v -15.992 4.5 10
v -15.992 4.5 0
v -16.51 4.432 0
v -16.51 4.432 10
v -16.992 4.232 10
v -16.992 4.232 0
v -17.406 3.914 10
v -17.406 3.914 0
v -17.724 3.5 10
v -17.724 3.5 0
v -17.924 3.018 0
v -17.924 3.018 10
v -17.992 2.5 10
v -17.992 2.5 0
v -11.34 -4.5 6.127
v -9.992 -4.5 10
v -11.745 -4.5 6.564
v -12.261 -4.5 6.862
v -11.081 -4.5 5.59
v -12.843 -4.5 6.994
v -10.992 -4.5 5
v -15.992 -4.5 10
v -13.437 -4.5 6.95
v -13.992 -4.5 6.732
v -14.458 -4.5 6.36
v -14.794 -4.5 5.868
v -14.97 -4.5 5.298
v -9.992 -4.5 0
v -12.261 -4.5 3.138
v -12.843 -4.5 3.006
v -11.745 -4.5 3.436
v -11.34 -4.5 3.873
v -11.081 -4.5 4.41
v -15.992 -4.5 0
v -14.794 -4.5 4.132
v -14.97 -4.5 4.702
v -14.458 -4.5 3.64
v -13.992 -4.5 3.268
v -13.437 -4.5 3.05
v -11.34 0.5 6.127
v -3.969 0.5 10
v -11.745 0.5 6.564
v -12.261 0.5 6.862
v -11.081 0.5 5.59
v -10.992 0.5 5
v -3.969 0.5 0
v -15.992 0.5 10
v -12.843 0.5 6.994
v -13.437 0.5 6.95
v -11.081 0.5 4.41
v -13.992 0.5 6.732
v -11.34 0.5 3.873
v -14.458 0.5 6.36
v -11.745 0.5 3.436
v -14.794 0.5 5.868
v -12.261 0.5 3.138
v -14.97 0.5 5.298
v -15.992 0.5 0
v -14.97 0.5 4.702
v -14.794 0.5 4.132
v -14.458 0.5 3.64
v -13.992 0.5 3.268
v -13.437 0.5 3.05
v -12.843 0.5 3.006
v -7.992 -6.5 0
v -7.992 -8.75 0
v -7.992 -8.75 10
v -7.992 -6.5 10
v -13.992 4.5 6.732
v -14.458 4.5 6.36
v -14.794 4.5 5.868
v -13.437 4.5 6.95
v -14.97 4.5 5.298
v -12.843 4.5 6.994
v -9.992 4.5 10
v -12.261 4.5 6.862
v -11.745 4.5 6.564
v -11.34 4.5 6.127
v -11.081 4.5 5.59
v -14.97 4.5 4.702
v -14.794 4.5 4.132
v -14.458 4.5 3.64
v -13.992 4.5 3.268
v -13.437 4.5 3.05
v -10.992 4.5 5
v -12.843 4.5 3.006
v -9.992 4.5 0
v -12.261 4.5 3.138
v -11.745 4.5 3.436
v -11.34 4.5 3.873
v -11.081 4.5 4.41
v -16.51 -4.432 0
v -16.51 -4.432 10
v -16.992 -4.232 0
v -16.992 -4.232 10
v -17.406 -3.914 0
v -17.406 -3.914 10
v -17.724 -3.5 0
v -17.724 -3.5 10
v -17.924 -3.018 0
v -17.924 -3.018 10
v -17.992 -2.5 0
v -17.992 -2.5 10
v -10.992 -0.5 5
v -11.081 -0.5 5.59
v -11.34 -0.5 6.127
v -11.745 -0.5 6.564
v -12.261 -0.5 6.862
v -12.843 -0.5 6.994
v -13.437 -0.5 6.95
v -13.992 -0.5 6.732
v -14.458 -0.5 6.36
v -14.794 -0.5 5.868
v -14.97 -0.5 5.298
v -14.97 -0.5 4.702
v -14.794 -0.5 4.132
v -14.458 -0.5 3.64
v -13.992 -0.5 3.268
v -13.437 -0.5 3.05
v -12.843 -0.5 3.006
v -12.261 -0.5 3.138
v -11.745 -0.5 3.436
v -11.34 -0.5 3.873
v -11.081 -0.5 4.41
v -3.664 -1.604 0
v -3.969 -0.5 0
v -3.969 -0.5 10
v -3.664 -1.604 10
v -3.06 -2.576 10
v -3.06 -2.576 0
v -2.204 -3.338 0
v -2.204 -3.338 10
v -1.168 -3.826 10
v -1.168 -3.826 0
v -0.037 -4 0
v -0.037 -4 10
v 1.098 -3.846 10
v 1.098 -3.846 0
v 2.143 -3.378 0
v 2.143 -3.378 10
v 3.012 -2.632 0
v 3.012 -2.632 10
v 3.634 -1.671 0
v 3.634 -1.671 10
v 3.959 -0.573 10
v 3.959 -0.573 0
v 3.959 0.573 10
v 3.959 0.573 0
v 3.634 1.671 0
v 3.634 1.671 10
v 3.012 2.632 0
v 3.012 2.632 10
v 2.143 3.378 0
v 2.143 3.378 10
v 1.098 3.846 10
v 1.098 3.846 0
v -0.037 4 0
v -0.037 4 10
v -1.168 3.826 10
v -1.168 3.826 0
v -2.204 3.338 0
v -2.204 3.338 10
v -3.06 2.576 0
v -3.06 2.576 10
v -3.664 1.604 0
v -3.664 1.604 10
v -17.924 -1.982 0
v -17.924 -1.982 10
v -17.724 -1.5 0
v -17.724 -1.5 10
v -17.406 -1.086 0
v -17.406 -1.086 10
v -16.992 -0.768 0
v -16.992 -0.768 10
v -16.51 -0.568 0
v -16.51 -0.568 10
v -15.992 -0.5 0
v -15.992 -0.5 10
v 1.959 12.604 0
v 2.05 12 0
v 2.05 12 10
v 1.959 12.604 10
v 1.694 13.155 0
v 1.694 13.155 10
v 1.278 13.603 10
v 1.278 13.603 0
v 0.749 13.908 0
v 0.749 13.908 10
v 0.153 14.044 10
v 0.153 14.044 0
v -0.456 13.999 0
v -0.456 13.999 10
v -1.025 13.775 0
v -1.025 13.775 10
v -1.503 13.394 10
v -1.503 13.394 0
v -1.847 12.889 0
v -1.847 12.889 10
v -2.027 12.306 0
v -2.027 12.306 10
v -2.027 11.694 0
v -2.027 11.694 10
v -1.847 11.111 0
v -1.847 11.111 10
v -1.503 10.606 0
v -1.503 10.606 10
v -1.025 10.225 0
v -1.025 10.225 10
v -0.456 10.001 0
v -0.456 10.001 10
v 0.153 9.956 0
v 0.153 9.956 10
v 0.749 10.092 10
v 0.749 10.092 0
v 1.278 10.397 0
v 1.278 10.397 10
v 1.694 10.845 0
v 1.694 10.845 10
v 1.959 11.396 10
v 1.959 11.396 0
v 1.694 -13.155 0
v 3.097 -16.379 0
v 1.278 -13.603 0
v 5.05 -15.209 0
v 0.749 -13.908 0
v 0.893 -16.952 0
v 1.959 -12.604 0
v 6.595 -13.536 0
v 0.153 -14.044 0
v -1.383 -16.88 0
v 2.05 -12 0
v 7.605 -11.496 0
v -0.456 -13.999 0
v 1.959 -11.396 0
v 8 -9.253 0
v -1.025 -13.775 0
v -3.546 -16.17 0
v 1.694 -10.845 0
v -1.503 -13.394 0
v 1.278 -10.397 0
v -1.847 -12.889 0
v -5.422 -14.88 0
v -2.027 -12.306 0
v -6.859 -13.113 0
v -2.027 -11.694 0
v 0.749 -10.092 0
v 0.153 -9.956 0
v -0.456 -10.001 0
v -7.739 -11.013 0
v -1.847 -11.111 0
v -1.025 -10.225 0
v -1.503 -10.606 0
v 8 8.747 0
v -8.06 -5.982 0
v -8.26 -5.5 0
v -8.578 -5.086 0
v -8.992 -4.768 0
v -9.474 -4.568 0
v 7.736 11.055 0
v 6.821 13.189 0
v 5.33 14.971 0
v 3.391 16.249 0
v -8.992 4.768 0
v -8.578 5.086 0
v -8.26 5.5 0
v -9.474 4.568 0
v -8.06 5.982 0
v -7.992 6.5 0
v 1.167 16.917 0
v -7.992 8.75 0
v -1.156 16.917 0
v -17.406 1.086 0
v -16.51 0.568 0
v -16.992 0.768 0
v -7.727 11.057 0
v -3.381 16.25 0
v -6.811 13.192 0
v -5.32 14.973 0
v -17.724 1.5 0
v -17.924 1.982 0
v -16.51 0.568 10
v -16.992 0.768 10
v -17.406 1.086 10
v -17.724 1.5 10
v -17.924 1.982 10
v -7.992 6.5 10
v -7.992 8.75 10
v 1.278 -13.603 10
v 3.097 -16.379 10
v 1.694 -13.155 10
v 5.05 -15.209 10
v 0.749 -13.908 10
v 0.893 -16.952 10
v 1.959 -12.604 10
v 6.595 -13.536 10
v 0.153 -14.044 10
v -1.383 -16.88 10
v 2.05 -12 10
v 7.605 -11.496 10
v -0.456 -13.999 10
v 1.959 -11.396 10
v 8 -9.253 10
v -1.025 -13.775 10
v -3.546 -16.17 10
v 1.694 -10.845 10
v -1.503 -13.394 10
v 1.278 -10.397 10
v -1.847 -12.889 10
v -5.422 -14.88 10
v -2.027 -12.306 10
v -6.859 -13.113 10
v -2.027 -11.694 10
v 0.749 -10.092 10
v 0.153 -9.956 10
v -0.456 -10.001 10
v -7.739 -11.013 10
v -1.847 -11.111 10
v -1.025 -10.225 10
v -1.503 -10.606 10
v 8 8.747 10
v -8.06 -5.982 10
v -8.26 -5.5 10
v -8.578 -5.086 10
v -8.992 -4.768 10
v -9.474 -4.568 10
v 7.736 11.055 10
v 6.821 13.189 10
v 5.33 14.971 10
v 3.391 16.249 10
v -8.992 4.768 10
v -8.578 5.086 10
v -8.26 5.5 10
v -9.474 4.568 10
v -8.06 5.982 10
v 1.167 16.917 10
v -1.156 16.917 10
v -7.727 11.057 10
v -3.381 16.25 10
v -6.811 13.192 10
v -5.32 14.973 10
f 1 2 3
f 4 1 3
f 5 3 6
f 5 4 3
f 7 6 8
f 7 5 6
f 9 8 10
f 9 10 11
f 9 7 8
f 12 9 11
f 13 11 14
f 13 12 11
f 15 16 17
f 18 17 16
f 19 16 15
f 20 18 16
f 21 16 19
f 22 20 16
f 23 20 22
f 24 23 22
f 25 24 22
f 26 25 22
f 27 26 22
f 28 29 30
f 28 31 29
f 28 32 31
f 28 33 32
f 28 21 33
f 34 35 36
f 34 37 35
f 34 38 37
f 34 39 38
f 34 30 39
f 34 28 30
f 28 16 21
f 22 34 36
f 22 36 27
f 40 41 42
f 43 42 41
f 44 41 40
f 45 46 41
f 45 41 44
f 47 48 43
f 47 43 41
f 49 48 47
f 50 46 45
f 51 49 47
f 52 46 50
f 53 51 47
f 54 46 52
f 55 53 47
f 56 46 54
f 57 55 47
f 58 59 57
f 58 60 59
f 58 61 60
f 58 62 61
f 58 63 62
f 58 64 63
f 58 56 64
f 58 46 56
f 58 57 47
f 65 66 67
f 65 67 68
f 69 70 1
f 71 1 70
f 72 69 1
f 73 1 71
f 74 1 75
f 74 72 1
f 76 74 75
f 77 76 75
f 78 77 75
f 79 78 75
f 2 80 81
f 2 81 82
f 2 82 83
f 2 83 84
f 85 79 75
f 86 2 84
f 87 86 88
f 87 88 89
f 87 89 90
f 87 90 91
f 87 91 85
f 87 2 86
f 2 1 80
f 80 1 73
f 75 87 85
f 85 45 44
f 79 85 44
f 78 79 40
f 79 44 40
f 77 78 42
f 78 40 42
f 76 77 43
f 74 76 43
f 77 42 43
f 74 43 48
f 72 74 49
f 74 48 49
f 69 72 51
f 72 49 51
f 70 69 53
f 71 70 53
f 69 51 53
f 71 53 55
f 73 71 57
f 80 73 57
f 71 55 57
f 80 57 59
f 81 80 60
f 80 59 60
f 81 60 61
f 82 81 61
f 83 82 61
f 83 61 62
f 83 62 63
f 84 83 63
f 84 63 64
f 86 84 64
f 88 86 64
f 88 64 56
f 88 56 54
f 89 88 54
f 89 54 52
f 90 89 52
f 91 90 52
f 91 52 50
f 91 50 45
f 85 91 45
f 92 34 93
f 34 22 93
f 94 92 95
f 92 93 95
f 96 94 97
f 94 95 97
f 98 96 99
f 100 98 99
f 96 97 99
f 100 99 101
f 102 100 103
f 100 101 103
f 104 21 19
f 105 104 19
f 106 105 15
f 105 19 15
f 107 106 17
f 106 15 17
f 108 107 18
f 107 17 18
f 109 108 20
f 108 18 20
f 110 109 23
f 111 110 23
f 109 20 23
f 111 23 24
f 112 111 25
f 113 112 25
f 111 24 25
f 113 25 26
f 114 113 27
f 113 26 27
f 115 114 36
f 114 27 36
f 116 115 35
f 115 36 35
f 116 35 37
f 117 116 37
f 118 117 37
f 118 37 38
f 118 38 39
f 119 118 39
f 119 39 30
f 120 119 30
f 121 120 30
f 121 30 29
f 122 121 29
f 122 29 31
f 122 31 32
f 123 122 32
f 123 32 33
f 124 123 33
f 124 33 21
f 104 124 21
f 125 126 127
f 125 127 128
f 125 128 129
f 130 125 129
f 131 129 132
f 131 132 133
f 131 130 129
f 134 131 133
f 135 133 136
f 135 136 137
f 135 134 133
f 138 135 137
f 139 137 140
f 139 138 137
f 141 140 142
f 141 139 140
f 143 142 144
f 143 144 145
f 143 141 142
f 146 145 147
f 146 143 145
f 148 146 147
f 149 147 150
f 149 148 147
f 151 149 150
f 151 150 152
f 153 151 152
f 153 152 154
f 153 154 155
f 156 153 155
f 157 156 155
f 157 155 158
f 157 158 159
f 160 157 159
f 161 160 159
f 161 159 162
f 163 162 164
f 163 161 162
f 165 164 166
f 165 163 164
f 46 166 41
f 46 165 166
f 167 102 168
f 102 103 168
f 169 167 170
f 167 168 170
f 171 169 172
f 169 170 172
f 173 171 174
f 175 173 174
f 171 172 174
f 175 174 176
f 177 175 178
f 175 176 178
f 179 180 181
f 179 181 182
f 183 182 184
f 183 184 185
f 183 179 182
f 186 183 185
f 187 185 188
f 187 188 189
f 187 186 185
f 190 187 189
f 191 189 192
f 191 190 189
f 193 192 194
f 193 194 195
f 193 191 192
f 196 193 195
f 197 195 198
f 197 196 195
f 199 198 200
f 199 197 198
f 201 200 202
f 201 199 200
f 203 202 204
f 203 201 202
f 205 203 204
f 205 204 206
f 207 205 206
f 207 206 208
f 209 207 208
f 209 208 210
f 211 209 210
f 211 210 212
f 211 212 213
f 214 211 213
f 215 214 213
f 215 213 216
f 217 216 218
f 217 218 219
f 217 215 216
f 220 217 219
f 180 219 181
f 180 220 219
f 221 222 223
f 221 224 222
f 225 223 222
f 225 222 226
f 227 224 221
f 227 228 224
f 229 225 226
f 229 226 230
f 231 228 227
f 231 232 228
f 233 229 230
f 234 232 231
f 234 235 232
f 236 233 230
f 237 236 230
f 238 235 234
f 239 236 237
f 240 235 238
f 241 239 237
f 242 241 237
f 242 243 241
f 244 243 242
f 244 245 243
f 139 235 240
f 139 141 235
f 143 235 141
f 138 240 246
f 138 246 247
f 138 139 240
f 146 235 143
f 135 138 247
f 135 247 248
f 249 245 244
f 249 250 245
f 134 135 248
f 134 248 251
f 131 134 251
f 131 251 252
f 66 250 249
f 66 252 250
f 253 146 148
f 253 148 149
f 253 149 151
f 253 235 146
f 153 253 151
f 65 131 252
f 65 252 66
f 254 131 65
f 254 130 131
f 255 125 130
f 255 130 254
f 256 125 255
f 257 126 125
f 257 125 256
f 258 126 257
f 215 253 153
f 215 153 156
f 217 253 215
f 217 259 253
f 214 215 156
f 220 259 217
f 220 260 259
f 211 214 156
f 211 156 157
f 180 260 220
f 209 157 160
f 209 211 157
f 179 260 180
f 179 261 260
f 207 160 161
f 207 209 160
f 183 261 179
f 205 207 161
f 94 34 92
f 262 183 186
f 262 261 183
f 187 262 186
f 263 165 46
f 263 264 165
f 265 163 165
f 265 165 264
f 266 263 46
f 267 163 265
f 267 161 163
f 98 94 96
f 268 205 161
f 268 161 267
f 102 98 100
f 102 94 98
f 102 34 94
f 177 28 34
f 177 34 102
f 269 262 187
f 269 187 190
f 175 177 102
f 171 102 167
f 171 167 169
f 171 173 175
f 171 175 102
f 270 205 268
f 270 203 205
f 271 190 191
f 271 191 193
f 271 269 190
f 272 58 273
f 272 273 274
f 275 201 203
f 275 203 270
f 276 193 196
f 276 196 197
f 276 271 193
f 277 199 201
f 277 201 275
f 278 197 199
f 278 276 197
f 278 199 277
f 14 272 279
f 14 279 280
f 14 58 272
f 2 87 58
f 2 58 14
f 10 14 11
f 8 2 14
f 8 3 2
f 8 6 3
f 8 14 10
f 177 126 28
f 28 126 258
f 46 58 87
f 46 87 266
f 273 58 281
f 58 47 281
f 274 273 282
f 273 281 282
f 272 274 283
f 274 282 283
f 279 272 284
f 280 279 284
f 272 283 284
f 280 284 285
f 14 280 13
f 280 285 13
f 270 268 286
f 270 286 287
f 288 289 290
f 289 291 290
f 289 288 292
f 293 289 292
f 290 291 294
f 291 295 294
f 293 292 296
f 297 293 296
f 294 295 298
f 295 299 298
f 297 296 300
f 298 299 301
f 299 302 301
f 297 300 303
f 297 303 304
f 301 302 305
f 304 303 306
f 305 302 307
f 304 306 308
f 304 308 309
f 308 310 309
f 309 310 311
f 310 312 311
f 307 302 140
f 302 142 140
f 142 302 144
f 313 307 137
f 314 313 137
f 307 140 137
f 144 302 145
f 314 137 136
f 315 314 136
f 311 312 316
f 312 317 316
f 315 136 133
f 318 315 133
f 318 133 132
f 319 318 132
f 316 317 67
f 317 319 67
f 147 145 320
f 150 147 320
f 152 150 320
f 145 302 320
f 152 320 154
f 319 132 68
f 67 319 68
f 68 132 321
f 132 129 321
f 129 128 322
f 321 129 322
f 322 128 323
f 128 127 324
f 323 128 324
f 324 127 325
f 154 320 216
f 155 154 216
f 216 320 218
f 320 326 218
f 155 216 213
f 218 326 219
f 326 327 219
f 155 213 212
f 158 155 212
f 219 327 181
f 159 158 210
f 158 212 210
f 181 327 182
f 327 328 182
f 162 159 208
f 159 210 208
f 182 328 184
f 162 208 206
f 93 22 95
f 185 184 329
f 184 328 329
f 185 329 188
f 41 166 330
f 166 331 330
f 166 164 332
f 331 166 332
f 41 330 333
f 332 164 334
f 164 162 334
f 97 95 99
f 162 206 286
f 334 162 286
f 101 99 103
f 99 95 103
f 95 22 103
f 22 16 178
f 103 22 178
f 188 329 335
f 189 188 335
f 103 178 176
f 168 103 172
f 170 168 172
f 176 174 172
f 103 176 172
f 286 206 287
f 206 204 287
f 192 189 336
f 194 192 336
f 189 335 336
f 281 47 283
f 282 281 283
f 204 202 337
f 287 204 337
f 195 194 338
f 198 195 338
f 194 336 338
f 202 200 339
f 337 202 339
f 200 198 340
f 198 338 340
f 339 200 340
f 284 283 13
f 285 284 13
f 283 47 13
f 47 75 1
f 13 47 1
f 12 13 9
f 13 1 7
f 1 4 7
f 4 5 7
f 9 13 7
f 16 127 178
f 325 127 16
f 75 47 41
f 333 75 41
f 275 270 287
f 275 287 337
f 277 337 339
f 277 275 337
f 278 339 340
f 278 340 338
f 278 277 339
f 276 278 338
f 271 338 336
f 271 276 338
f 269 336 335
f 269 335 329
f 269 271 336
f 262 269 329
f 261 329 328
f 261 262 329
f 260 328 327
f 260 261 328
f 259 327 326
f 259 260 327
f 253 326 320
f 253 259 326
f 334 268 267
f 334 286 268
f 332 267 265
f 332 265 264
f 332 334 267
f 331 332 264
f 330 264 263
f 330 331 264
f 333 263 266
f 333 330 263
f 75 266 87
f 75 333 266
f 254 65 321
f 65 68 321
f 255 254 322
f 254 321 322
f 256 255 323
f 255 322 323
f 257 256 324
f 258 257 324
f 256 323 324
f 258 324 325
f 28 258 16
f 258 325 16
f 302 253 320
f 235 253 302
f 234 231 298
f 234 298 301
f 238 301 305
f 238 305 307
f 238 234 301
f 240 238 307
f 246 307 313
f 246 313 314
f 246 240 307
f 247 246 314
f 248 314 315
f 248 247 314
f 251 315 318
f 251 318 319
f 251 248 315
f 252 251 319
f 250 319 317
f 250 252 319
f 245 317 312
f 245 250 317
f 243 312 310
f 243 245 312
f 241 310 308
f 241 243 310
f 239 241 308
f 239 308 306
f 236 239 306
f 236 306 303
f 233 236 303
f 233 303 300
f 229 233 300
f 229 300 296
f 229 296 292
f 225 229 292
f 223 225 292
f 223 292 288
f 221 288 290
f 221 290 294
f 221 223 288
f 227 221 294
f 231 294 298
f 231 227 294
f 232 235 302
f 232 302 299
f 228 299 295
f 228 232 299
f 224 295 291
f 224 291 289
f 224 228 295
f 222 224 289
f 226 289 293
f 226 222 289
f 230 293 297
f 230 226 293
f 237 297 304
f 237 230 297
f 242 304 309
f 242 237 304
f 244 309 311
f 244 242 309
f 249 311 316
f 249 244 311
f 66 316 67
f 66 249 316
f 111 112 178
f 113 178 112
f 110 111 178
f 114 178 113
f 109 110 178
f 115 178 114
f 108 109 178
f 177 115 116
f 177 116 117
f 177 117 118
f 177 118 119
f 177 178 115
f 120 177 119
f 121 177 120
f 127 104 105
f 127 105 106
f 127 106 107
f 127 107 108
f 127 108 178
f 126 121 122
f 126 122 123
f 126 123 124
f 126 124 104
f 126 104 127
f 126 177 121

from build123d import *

# Parameters (mm, degrees)
ESBO_O1_R                = 2.05
RESSALTO_EXTRUS_O1_DEPTH = 10
CORTE_EXTRUS_O1_REACH    = 31.766
ESBO_O2_R                = 2
FILETE1_R                = 2


with BuildPart() as part:
    # Esboço1 → Ressalto-extrusão1 (new body)
    with BuildSketch(Plane.XY):
        with BuildLine():
            Line((-7.992042116, -8.75), (-7.992042116, -4.5))
            Line((-7.992042116, -4.5), (-17.992042116, -4.5))
            Line((-17.992042116, -4.5), (-17.992042116, -0.5))
            Line((-17.992042116, -0.5), (-8, -0.5))
            Line((-8, -0.5), (-3.968626967, -0.5))
            ThreePointArc((-3.968626967, -0.5), (4, 0), (-3.968626967, 0.5))
            Line((-3.968626967, 0.5), (-8, 0.5))
            Line((-8, 0.5), (-17.992042116, 0.5))
            Line((-17.992042116, 0.5), (-17.992042116, 4.5))
            Line((-17.992042116, 4.5), (-7.992042116, 4.5))
            Line((-7.992042116, 4.5), (-7.992042116, 8.75))
            ThreePointArc((-7.992042116, 8.75), (0.005510323, 17.001506438), (7.999953669, 8.74698773))
            Line((7.999953669, 8.74698773), (8.000049012, -9.25301227))
            ThreePointArc((8.000049012, -9.25301227), (-0.247502701, -16.997552144), (-7.992042116, -8.75))
        make_face()
        with Locations((0, 12)):
            Circle(ESBO_O1_R, mode=Mode.SUBTRACT)
        with Locations((0, -12)):
            Circle(ESBO_O1_R, mode=Mode.SUBTRACT)
    extrude(amount=RESSALTO_EXTRUS_O1_DEPTH)

    # Corte-extrusão1: up to this face of the body (flat: up to its plane)
    corte_extrus_o1_end = Plane(part.part.faces().sort_by_distance((-12.992042116, 4.5, 5))[0])
    # Esboço2 → Corte-extrusão1 (cut, up to the picked face)
    with BuildSketch(Plane.XZ.offset(4.5), mode=Mode.PRIVATE) as corte_extrus_o1_sk1:
        with Locations((-12.992042116, 5)):
            Circle(ESBO_O2_R)
    corte_extrus_o1_tool1 = split(extrude(corte_extrus_o1_sk1.sketch, amount=-CORTE_EXTRUS_O1_REACH, mode=Mode.PRIVATE), bisect_by=corte_extrus_o1_end, keep=Keep.BOTH, mode=Mode.PRIVATE)
    add(corte_extrus_o1_tool1.solids().sort_by(Axis((-12.992042, -4.5, 5), (0, 1, 0)))[0], mode=Mode.SUBTRACT)

    # Filete1
    filete1_edges = [part.edges().sort_by_distance(p)[0] for p in [
        (-7.992042116, -4.5, 5),
        (-7.992042116, 4.5, 5),
        (-17.992042116, -4.5, 5),
        (-17.992042116, 0.5, 5),
        (-17.992042116, -0.5, 5),
        (-17.992042116, 4.5, 5),
    ]]
    fillet(filete1_edges, radius=FILETE1_R - 0.0001)  # a hair under: the kernel refuses the full size


solid = part.part
